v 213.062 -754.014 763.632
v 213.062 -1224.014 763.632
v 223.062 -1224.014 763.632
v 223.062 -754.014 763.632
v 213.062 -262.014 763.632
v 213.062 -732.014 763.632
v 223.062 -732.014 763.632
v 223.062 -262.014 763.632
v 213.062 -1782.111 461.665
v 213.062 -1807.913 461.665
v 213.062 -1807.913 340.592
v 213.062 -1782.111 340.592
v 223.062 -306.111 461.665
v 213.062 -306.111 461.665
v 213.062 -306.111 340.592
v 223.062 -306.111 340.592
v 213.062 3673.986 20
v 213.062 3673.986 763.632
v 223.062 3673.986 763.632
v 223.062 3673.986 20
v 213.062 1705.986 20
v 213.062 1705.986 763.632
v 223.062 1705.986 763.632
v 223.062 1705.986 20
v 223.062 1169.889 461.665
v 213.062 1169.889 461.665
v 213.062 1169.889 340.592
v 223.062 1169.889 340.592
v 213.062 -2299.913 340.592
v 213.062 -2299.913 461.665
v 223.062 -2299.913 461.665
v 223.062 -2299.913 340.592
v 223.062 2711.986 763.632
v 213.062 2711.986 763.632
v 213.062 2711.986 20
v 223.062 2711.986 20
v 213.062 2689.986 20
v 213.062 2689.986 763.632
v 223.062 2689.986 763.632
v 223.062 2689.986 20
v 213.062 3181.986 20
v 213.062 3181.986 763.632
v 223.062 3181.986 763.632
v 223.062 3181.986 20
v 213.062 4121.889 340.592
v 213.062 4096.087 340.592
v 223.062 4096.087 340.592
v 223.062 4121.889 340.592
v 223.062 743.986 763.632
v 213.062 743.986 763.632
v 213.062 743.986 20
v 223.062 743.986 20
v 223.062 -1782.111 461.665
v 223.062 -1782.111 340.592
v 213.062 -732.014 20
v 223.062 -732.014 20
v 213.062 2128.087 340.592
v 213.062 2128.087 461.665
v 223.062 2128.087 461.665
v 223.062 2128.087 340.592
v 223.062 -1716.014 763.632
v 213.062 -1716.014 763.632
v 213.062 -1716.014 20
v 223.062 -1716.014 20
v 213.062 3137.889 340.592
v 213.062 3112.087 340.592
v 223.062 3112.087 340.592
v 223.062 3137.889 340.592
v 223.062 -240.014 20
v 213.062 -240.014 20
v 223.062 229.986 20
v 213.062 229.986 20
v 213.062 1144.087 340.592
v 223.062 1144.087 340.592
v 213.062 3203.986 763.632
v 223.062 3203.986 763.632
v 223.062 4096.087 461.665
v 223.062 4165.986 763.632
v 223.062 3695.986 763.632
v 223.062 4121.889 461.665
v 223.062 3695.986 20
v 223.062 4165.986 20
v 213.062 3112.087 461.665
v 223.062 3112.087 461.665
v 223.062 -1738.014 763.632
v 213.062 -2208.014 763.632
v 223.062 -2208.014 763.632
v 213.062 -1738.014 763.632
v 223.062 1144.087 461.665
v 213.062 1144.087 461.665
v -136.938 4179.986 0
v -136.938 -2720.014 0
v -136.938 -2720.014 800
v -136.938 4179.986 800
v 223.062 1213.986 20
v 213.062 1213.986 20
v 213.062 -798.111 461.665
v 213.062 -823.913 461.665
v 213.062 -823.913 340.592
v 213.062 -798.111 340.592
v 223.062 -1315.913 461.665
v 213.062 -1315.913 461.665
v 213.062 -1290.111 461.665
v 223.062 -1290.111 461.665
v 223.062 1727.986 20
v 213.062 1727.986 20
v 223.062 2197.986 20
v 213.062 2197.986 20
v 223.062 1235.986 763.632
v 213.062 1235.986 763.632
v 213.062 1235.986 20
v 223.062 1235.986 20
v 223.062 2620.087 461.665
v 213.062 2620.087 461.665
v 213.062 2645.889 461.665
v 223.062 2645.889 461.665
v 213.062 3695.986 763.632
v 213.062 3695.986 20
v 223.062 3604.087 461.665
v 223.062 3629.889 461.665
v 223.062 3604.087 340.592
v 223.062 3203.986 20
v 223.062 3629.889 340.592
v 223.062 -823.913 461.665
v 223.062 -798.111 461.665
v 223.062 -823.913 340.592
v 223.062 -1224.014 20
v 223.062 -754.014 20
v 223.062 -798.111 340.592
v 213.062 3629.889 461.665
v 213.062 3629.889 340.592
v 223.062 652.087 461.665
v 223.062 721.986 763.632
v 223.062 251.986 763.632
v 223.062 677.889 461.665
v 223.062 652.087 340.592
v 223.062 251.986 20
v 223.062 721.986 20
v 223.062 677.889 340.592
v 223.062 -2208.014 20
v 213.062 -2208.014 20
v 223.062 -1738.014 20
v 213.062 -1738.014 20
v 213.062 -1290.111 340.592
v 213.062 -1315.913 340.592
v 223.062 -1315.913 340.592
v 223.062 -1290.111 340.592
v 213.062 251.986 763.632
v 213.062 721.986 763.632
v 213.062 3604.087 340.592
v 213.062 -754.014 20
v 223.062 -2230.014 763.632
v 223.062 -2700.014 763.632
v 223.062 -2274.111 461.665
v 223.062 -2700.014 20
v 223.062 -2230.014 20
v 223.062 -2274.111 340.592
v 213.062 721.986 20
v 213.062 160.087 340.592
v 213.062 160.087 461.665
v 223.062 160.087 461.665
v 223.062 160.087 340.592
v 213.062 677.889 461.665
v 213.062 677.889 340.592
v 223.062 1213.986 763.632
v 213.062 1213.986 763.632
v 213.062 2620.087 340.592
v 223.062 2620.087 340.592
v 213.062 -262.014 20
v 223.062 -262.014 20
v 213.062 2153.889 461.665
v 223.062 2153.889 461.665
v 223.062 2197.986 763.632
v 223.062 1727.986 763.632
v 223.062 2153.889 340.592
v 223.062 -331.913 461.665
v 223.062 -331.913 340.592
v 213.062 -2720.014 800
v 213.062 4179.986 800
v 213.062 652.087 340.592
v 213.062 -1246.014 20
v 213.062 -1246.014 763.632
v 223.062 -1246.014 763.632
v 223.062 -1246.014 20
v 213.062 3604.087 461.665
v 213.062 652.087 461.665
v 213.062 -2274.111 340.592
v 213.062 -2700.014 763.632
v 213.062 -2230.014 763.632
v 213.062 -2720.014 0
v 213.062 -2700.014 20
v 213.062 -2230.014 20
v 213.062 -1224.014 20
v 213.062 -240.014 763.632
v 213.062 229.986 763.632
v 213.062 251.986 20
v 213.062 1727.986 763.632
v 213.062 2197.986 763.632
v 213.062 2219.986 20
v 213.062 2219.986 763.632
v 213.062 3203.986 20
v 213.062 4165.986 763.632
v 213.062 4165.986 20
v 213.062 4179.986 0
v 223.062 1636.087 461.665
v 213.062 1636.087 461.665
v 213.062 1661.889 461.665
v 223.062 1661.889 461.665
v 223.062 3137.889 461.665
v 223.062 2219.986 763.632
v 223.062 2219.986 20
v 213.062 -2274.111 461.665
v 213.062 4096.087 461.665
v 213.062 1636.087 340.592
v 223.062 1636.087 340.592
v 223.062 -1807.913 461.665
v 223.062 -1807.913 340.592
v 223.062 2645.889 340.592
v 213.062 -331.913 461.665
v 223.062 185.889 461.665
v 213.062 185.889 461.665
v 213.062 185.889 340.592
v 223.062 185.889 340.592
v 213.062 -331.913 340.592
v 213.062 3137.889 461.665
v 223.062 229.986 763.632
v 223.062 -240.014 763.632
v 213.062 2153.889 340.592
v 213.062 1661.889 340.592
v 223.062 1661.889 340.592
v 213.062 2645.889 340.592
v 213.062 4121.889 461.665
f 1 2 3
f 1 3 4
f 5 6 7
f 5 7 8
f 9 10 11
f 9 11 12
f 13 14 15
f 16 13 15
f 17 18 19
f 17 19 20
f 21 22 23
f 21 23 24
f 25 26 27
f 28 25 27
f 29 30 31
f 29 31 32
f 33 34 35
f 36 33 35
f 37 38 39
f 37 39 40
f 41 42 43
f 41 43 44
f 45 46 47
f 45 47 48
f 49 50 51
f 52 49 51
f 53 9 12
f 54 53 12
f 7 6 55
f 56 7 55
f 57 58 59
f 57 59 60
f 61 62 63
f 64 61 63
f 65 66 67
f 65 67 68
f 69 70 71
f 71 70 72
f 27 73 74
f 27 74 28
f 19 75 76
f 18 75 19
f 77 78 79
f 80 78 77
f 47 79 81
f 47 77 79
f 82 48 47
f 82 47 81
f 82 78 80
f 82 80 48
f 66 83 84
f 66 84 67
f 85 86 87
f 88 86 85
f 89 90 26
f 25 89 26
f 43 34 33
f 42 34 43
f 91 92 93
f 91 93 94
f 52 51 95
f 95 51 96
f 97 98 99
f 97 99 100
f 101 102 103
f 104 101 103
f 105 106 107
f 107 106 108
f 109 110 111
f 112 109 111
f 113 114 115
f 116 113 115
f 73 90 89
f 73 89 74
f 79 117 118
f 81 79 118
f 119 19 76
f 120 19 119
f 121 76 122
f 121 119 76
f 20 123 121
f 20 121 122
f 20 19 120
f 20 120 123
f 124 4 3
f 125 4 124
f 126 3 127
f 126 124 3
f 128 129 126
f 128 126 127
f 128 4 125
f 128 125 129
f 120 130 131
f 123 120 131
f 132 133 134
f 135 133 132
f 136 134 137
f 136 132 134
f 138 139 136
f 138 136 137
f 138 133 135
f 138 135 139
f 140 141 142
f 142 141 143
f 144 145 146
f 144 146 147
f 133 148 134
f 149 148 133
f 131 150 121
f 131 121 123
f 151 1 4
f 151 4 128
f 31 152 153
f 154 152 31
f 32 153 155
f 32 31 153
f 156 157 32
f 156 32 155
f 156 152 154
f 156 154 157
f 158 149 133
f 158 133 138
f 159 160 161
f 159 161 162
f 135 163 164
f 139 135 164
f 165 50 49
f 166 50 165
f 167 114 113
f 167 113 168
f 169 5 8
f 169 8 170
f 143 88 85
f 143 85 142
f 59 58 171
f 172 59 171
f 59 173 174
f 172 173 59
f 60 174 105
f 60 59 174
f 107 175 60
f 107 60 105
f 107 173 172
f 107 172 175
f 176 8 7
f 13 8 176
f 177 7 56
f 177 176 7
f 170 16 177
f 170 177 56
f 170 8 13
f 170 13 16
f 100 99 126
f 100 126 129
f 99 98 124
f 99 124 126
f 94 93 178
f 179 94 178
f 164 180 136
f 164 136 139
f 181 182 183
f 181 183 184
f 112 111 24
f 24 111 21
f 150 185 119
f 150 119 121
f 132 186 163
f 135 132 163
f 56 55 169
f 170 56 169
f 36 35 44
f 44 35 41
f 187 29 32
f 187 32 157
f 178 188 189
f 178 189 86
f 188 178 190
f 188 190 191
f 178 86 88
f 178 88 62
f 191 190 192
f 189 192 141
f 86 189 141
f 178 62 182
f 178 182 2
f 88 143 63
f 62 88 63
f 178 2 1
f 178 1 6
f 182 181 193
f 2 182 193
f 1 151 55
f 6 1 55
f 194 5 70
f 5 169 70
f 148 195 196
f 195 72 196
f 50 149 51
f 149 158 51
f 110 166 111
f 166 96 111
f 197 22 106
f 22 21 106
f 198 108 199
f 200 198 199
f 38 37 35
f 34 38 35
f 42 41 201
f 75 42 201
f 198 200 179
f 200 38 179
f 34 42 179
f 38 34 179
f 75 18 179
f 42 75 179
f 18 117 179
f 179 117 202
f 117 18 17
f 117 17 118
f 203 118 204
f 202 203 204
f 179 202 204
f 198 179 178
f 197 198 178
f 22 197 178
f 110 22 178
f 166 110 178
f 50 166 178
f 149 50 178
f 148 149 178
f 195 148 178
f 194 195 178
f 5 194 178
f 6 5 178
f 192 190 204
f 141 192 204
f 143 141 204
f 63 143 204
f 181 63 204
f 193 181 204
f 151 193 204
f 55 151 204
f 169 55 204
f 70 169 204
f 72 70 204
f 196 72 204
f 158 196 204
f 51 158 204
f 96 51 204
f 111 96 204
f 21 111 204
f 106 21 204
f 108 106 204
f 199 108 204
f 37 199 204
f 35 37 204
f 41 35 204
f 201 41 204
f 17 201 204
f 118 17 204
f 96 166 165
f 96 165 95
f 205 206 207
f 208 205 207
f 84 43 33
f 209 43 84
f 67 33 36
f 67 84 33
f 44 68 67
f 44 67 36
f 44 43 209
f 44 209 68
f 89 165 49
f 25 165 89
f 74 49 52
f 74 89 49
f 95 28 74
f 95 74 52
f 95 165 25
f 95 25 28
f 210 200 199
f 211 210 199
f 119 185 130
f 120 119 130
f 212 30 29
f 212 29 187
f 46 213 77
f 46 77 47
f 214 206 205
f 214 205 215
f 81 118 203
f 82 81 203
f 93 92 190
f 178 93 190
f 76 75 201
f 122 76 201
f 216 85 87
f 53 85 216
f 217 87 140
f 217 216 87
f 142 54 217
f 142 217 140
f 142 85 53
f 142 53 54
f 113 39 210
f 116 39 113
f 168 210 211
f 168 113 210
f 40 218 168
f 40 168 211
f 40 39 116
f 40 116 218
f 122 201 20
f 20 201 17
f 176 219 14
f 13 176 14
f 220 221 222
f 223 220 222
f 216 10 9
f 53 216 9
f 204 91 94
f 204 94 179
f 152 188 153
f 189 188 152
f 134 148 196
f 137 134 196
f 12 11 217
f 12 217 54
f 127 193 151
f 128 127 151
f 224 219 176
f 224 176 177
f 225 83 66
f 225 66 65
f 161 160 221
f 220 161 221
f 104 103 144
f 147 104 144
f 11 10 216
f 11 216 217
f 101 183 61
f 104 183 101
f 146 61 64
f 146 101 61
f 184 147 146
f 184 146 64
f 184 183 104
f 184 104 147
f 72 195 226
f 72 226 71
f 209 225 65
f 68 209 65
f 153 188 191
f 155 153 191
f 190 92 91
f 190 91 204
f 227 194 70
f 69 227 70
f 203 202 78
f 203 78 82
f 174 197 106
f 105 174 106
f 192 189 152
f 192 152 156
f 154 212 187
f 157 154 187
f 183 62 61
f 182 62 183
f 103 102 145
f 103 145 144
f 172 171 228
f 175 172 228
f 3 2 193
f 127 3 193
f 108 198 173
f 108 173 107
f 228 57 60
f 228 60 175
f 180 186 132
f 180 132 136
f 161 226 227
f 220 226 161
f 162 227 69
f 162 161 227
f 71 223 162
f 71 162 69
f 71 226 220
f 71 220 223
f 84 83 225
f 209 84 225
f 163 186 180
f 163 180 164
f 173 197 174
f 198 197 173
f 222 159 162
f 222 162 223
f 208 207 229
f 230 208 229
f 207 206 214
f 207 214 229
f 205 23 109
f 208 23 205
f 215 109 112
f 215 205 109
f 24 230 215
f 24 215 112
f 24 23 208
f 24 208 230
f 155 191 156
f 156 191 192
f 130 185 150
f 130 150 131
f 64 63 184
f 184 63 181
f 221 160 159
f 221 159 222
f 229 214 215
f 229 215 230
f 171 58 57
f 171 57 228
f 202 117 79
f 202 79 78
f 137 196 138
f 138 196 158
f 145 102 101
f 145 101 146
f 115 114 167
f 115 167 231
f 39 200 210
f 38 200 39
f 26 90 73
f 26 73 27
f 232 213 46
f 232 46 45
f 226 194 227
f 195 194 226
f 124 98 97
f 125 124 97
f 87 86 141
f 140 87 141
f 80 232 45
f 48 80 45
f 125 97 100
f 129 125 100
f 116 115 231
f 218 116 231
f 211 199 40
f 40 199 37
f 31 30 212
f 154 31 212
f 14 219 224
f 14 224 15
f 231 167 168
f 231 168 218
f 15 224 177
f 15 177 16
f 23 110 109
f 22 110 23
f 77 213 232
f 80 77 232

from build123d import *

# Parameters (mm, degrees)
SKETCH1_W           = 350
SKETCH1_H           = 6900
BOSS_EXTRUDE1_DEPTH = 800
SKETCH3_W           = 743.632052548
SKETCH3_H           = 470
SKETCH3_W_2         = 121.072841775
SKETCH3_H_2         = 25.802408902
BOSS_EXTRUDE3_DEPTH = 10


with BuildPart() as part:
    # Sketch1 → Boss-Extrude1 (new body)
    with BuildSketch(Plane.XY):
        with Locations((38.061970043, 729.986327315)):
            Rectangle(SKETCH1_W, SKETCH1_H)
    extrude(amount=BOSS_EXTRUDE1_DEPTH)

    # Sketch3 → Boss-Extrude3 (add)
    with BuildSketch(Plane(origin=(213.061970043, 0, 0), x_dir=(0, 0, -1), z_dir=(1, 0, 0))):
        with Locations((-391.816026274, -2465.013672685)):
            Rectangle(SKETCH3_W, SKETCH3_H)
        with Locations((-401.128332344, -2287.011976611)):
            Rectangle(SKETCH3_W_2, SKETCH3_H_2, mode=Mode.SUBTRACT)
        with Locations((-391.816026274, -1481.013672685)):
            Rectangle(SKETCH3_W, SKETCH3_H)
        with Locations((-401.128332344, -1303.011976611)):
            Rectangle(SKETCH3_W_2, SKETCH3_H_2, mode=Mode.SUBTRACT)
        with Locations((-391.816026274, -1973.013672685)):
            Rectangle(SKETCH3_W, SKETCH3_H)
        with Locations((-401.128332344, -1795.011976611)):
            Rectangle(SKETCH3_W_2, SKETCH3_H_2, mode=Mode.SUBTRACT)
        with Locations((-391.816026274, -989.013672685)):
            Rectangle(SKETCH3_W, SKETCH3_H)
        with Locations((-401.128332344, -811.011976611)):
            Rectangle(SKETCH3_W_2, SKETCH3_H_2, mode=Mode.SUBTRACT)
        with Locations((-391.816026274, -497.013672685)):
            Rectangle(SKETCH3_W, SKETCH3_H)
        with Locations((-401.128332344, -319.011976611)):
            Rectangle(SKETCH3_W_2, SKETCH3_H_2, mode=Mode.SUBTRACT)
        with Locations((-391.816026274, -5.013672685)):
            Rectangle(SKETCH3_W, SKETCH3_H)
        with Locations((-401.128332344, 172.988023389)):
            Rectangle(SKETCH3_W_2, SKETCH3_H_2, mode=Mode.SUBTRACT)
        with Locations((-391.816026274, 486.986327315)):
            Rectangle(SKETCH3_W, SKETCH3_H)
        with Locations((-401.128332344, 664.988023389)):
            Rectangle(SKETCH3_W_2, SKETCH3_H_2, mode=Mode.SUBTRACT)
        with Locations((-391.816026274, 978.986327315)):
            Rectangle(SKETCH3_W, SKETCH3_H)
        with Locations((-401.128332344, 1156.988023389)):
            Rectangle(SKETCH3_W_2, SKETCH3_H_2, mode=Mode.SUBTRACT)
        with Locations((-391.816026274, 1470.986327315)):
            Rectangle(SKETCH3_W, SKETCH3_H)
        with Locations((-401.128332344, 1648.988023389)):
            Rectangle(SKETCH3_W_2, SKETCH3_H_2, mode=Mode.SUBTRACT)
        with Locations((-391.816026274, 1962.986327315)):
            Rectangle(SKETCH3_W, SKETCH3_H)
        with Locations((-401.128332344, 2140.988023389)):
            Rectangle(SKETCH3_W_2, SKETCH3_H_2, mode=Mode.SUBTRACT)
        with Locations((-391.816026274, 2454.986327315)):
            Rectangle(SKETCH3_W, SKETCH3_H)
        with Locations((-401.128332344, 2632.988023389)):
            Rectangle(SKETCH3_W_2, SKETCH3_H_2, mode=Mode.SUBTRACT)
        with Locations((-391.816026274, 2946.986327315)):
            Rectangle(SKETCH3_W, SKETCH3_H)
        with Locations((-401.128332344, 3124.988023389)):
            Rectangle(SKETCH3_W_2, SKETCH3_H_2, mode=Mode.SUBTRACT)
        with Locations((-391.816026274, 3438.986327315)):
            Rectangle(SKETCH3_W, SKETCH3_H)
        with Locations((-401.128332344, 3616.988023389)):
            Rectangle(SKETCH3_W_2, SKETCH3_H_2, mode=Mode.SUBTRACT)
        with Locations((-391.816026274, 3930.986327315)):
            Rectangle(SKETCH3_W, SKETCH3_H)
        with Locations((-401.128332344, 4108.988023389)):
            Rectangle(SKETCH3_W_2, SKETCH3_H_2, mode=Mode.SUBTRACT)
    extrude(amount=BOSS_EXTRUDE3_DEPTH)


solid = part.part
